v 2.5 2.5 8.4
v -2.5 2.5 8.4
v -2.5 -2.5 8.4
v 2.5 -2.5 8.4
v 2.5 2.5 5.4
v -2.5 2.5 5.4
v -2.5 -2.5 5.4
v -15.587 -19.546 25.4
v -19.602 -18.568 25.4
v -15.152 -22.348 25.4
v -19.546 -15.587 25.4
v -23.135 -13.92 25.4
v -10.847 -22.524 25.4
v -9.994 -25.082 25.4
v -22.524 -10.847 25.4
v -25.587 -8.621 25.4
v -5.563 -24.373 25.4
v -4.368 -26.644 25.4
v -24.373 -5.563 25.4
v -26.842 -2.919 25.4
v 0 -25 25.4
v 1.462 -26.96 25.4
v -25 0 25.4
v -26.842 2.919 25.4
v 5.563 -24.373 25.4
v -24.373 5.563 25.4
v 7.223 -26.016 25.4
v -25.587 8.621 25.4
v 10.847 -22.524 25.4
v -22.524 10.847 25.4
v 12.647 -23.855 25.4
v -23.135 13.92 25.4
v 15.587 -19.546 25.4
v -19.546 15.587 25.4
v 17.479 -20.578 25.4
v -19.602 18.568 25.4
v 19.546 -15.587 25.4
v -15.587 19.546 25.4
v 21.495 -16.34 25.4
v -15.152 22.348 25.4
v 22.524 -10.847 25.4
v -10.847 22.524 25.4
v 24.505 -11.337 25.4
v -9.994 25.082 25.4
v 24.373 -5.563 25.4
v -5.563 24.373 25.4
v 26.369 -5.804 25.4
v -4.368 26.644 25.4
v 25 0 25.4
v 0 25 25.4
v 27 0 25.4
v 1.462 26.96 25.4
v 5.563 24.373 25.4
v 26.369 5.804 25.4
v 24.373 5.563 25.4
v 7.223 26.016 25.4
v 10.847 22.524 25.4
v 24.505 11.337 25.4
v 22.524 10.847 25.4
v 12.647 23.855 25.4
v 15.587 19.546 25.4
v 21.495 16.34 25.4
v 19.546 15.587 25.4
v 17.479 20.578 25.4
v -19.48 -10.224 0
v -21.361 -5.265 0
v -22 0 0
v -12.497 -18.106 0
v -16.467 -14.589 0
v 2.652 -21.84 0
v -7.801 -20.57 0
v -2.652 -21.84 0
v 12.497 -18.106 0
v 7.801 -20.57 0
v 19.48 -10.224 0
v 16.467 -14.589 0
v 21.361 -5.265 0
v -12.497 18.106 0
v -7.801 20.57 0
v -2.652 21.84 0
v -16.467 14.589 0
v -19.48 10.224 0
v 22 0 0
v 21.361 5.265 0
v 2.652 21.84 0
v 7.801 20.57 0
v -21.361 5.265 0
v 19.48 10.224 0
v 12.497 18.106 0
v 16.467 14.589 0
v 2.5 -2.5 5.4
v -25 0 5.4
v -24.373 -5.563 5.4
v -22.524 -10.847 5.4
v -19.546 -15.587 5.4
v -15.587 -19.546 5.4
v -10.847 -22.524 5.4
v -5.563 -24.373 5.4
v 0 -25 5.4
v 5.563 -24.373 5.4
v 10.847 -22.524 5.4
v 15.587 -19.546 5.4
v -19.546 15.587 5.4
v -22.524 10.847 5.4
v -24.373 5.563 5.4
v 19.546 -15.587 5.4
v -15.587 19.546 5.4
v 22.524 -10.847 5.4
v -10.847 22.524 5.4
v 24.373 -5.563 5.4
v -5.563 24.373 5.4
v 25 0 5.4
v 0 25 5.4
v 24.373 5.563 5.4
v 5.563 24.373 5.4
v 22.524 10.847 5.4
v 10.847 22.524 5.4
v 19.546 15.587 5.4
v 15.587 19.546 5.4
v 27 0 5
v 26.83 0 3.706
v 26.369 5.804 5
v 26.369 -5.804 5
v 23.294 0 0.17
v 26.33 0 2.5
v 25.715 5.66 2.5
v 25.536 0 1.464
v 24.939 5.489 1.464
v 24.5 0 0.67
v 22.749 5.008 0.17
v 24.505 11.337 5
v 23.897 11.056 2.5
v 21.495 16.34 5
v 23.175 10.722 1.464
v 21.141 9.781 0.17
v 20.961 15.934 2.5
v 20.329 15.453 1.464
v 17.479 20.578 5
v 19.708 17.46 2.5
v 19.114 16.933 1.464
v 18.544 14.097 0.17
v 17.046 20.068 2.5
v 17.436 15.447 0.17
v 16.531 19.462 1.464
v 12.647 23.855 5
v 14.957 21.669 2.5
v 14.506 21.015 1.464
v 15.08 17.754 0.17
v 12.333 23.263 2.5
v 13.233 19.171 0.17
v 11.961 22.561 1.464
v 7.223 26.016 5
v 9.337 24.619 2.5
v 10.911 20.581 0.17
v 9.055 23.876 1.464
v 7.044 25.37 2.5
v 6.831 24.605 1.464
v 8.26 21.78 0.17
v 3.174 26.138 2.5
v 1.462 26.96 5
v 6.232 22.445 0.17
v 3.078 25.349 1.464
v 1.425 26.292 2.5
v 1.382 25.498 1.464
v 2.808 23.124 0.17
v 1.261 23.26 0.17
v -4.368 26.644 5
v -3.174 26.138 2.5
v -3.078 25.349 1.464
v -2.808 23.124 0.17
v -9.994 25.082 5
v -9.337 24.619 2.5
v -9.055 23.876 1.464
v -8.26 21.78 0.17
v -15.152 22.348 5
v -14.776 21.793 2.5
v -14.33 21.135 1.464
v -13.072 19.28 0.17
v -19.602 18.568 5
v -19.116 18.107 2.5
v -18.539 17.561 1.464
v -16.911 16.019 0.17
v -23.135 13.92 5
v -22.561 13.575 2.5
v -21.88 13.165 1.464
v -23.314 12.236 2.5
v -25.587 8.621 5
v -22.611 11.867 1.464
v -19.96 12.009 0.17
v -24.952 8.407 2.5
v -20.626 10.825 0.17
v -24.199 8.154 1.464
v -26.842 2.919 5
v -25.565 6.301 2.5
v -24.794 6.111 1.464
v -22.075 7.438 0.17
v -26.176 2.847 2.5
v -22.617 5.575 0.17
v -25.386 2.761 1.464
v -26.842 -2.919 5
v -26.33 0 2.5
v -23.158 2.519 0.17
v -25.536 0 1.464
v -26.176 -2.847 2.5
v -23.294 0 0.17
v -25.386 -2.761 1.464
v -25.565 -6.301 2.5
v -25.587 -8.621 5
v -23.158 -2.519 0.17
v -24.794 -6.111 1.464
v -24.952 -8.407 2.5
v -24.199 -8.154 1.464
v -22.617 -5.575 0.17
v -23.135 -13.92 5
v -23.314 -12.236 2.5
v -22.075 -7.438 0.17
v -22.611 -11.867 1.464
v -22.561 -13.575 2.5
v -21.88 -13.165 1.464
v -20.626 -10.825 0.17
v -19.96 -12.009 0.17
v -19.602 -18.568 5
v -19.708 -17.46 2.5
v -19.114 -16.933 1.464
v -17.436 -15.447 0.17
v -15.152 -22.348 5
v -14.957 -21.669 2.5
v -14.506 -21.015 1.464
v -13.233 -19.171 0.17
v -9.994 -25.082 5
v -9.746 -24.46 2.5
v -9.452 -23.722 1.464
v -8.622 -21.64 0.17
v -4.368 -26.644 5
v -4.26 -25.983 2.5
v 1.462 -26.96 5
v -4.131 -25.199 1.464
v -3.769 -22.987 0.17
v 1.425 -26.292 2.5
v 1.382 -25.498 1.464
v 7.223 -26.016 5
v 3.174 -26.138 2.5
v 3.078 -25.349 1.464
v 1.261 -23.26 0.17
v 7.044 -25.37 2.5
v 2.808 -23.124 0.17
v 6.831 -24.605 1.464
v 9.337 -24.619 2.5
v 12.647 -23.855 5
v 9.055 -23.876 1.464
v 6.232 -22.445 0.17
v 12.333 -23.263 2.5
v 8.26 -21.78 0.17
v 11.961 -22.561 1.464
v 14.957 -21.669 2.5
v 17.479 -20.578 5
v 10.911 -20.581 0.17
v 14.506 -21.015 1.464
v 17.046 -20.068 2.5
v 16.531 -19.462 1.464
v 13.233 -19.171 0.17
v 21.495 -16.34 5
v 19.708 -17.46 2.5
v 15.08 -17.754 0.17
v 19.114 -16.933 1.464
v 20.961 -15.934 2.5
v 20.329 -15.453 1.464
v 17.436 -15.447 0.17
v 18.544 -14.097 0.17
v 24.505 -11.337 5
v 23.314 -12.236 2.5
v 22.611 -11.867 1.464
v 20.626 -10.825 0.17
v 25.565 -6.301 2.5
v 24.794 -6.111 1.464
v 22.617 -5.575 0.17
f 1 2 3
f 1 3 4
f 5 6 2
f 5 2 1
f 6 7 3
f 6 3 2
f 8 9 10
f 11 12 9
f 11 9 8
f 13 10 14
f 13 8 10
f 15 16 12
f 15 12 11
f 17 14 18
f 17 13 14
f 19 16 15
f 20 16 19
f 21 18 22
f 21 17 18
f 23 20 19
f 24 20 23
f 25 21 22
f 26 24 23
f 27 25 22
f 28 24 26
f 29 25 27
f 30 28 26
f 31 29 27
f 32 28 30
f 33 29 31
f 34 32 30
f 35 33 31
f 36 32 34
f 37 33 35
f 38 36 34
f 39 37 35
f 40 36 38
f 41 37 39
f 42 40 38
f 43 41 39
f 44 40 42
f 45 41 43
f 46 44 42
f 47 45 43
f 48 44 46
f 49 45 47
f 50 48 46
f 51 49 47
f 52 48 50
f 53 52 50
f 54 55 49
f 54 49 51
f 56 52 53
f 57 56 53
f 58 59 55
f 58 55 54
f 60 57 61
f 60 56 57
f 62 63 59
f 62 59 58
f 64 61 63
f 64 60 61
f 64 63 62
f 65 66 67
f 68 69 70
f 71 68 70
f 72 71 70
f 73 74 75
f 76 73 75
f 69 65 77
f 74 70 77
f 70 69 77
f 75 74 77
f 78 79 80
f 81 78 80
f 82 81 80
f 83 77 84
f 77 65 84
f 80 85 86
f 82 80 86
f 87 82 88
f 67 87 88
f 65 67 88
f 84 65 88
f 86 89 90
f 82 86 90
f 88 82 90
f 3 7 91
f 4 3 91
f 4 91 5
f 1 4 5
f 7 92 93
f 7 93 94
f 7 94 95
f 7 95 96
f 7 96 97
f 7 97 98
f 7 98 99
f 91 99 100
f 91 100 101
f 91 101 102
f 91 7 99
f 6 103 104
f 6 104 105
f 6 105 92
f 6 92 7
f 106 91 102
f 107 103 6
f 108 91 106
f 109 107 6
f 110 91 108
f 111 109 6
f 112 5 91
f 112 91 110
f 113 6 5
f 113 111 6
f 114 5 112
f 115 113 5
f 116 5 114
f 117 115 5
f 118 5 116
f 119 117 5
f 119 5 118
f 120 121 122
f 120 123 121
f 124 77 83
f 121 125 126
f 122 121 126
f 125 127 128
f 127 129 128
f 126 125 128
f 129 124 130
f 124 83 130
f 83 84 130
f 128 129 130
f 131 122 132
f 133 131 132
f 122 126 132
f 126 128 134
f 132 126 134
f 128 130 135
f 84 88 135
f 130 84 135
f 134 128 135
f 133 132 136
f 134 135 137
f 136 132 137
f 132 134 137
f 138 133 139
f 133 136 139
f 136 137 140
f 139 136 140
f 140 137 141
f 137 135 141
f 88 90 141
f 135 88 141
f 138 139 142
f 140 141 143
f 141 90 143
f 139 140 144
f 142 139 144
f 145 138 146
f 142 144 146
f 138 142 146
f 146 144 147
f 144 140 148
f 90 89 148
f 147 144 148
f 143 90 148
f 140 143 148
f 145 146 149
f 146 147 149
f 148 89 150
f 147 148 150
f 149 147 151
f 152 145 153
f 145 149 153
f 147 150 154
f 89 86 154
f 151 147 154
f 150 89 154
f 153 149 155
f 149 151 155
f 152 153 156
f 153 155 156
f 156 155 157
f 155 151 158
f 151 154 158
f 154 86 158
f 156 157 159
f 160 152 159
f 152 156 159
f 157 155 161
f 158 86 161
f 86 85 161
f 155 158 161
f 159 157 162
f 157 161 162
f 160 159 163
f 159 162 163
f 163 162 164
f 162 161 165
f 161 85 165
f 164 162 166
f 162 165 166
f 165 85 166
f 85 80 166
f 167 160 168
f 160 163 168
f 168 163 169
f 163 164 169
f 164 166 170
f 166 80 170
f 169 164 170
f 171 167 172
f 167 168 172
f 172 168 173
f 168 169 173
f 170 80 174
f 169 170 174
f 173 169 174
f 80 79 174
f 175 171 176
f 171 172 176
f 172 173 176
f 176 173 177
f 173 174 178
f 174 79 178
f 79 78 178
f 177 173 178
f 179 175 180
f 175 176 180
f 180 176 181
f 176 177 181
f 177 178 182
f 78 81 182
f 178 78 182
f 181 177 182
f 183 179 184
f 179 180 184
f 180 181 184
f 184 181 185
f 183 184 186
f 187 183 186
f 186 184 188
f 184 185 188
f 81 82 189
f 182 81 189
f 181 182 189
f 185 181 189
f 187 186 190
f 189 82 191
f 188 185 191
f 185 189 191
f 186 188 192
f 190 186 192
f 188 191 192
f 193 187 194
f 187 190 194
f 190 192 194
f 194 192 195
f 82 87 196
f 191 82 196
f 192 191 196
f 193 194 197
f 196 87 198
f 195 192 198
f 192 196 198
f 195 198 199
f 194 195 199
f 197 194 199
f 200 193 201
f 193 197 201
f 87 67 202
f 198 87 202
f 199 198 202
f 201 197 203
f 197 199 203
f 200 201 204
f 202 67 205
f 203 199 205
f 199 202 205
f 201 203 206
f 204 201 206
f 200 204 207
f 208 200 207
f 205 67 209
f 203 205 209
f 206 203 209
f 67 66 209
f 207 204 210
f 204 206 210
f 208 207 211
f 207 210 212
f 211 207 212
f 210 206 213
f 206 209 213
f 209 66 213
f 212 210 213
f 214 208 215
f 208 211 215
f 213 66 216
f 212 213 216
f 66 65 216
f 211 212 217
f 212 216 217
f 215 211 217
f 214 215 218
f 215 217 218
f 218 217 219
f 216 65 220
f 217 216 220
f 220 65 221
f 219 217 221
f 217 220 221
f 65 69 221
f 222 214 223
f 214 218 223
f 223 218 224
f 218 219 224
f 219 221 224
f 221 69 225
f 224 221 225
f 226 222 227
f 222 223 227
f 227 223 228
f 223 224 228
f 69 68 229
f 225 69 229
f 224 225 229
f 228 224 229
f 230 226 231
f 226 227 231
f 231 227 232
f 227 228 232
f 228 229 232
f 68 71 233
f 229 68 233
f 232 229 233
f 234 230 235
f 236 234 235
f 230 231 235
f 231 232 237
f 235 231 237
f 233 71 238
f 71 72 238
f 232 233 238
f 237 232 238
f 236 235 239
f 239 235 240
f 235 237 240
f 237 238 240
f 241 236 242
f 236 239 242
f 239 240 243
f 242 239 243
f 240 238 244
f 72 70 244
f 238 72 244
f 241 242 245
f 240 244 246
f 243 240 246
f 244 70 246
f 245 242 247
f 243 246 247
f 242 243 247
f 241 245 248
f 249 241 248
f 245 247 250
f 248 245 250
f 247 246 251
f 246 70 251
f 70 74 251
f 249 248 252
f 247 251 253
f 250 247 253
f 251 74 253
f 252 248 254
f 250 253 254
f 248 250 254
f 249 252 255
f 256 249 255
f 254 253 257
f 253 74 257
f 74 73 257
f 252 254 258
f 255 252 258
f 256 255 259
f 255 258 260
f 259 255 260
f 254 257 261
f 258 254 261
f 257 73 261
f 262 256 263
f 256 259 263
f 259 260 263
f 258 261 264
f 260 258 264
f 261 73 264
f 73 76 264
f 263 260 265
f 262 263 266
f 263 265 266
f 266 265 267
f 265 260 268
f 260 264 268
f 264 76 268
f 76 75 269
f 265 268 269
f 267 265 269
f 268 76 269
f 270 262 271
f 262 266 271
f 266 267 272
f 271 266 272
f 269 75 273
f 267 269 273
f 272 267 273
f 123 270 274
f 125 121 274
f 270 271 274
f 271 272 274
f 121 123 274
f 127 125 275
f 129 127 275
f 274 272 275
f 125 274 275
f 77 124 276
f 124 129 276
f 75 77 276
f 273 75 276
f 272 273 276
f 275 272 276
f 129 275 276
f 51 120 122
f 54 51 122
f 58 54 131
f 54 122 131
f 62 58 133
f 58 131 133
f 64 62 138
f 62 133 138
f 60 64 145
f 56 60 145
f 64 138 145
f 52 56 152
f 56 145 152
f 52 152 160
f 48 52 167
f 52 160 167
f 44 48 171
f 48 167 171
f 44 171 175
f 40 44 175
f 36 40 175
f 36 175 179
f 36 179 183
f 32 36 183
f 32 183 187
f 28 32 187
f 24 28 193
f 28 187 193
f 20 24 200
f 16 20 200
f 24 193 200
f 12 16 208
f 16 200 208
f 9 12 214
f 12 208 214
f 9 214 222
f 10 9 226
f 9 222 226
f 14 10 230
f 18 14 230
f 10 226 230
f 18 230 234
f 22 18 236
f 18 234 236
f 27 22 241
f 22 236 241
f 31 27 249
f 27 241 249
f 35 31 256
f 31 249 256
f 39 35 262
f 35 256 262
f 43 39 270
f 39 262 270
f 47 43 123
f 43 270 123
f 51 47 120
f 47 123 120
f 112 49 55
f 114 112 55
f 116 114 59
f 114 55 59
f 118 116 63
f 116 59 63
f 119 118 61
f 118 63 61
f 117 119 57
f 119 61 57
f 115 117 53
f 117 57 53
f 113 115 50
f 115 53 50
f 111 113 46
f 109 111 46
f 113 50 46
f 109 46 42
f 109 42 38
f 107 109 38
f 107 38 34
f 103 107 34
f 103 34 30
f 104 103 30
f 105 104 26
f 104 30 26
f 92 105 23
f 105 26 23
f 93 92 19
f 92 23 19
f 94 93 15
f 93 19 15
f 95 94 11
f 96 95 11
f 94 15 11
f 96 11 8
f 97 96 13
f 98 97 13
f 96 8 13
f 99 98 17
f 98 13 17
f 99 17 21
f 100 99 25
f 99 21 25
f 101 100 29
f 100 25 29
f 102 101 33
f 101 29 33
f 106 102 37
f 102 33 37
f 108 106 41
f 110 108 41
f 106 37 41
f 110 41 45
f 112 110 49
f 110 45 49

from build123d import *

# Parameters (mm, degrees)
F0_R     = 27
F5_DEPTH = 25.4
F1_R     = 25
F2_DEPTH = 20
F3_R     = 5
F4_W     = 5
F4_H     = 5
F6_DEPTH = 3


with BuildPart() as f5:
    # F0 (on Top) → F5 (new body)
    with BuildSketch(Plane.XY):
        Circle(F0_R)
    extrude(amount=F5_DEPTH)

    # F1 (on face) → F2 (cut)
    with BuildSketch(Plane.XY.offset(25.4)):
        Circle(F1_R)
    extrude(amount=-F2_DEPTH, mode=Mode.SUBTRACT)

    # F3
    f3_edges = [f5.edges().sort_by_distance(p)[0] for p in [
        (-27, 0, 0),
    ]]
    fillet(f3_edges, radius=F3_R)

    # F4 (on face) → F6 (join)
    with BuildSketch(Plane.XY.offset(5.4)):
        Rectangle(F4_W, F4_H)
    extrude(amount=F6_DEPTH)


solid = f5.part
